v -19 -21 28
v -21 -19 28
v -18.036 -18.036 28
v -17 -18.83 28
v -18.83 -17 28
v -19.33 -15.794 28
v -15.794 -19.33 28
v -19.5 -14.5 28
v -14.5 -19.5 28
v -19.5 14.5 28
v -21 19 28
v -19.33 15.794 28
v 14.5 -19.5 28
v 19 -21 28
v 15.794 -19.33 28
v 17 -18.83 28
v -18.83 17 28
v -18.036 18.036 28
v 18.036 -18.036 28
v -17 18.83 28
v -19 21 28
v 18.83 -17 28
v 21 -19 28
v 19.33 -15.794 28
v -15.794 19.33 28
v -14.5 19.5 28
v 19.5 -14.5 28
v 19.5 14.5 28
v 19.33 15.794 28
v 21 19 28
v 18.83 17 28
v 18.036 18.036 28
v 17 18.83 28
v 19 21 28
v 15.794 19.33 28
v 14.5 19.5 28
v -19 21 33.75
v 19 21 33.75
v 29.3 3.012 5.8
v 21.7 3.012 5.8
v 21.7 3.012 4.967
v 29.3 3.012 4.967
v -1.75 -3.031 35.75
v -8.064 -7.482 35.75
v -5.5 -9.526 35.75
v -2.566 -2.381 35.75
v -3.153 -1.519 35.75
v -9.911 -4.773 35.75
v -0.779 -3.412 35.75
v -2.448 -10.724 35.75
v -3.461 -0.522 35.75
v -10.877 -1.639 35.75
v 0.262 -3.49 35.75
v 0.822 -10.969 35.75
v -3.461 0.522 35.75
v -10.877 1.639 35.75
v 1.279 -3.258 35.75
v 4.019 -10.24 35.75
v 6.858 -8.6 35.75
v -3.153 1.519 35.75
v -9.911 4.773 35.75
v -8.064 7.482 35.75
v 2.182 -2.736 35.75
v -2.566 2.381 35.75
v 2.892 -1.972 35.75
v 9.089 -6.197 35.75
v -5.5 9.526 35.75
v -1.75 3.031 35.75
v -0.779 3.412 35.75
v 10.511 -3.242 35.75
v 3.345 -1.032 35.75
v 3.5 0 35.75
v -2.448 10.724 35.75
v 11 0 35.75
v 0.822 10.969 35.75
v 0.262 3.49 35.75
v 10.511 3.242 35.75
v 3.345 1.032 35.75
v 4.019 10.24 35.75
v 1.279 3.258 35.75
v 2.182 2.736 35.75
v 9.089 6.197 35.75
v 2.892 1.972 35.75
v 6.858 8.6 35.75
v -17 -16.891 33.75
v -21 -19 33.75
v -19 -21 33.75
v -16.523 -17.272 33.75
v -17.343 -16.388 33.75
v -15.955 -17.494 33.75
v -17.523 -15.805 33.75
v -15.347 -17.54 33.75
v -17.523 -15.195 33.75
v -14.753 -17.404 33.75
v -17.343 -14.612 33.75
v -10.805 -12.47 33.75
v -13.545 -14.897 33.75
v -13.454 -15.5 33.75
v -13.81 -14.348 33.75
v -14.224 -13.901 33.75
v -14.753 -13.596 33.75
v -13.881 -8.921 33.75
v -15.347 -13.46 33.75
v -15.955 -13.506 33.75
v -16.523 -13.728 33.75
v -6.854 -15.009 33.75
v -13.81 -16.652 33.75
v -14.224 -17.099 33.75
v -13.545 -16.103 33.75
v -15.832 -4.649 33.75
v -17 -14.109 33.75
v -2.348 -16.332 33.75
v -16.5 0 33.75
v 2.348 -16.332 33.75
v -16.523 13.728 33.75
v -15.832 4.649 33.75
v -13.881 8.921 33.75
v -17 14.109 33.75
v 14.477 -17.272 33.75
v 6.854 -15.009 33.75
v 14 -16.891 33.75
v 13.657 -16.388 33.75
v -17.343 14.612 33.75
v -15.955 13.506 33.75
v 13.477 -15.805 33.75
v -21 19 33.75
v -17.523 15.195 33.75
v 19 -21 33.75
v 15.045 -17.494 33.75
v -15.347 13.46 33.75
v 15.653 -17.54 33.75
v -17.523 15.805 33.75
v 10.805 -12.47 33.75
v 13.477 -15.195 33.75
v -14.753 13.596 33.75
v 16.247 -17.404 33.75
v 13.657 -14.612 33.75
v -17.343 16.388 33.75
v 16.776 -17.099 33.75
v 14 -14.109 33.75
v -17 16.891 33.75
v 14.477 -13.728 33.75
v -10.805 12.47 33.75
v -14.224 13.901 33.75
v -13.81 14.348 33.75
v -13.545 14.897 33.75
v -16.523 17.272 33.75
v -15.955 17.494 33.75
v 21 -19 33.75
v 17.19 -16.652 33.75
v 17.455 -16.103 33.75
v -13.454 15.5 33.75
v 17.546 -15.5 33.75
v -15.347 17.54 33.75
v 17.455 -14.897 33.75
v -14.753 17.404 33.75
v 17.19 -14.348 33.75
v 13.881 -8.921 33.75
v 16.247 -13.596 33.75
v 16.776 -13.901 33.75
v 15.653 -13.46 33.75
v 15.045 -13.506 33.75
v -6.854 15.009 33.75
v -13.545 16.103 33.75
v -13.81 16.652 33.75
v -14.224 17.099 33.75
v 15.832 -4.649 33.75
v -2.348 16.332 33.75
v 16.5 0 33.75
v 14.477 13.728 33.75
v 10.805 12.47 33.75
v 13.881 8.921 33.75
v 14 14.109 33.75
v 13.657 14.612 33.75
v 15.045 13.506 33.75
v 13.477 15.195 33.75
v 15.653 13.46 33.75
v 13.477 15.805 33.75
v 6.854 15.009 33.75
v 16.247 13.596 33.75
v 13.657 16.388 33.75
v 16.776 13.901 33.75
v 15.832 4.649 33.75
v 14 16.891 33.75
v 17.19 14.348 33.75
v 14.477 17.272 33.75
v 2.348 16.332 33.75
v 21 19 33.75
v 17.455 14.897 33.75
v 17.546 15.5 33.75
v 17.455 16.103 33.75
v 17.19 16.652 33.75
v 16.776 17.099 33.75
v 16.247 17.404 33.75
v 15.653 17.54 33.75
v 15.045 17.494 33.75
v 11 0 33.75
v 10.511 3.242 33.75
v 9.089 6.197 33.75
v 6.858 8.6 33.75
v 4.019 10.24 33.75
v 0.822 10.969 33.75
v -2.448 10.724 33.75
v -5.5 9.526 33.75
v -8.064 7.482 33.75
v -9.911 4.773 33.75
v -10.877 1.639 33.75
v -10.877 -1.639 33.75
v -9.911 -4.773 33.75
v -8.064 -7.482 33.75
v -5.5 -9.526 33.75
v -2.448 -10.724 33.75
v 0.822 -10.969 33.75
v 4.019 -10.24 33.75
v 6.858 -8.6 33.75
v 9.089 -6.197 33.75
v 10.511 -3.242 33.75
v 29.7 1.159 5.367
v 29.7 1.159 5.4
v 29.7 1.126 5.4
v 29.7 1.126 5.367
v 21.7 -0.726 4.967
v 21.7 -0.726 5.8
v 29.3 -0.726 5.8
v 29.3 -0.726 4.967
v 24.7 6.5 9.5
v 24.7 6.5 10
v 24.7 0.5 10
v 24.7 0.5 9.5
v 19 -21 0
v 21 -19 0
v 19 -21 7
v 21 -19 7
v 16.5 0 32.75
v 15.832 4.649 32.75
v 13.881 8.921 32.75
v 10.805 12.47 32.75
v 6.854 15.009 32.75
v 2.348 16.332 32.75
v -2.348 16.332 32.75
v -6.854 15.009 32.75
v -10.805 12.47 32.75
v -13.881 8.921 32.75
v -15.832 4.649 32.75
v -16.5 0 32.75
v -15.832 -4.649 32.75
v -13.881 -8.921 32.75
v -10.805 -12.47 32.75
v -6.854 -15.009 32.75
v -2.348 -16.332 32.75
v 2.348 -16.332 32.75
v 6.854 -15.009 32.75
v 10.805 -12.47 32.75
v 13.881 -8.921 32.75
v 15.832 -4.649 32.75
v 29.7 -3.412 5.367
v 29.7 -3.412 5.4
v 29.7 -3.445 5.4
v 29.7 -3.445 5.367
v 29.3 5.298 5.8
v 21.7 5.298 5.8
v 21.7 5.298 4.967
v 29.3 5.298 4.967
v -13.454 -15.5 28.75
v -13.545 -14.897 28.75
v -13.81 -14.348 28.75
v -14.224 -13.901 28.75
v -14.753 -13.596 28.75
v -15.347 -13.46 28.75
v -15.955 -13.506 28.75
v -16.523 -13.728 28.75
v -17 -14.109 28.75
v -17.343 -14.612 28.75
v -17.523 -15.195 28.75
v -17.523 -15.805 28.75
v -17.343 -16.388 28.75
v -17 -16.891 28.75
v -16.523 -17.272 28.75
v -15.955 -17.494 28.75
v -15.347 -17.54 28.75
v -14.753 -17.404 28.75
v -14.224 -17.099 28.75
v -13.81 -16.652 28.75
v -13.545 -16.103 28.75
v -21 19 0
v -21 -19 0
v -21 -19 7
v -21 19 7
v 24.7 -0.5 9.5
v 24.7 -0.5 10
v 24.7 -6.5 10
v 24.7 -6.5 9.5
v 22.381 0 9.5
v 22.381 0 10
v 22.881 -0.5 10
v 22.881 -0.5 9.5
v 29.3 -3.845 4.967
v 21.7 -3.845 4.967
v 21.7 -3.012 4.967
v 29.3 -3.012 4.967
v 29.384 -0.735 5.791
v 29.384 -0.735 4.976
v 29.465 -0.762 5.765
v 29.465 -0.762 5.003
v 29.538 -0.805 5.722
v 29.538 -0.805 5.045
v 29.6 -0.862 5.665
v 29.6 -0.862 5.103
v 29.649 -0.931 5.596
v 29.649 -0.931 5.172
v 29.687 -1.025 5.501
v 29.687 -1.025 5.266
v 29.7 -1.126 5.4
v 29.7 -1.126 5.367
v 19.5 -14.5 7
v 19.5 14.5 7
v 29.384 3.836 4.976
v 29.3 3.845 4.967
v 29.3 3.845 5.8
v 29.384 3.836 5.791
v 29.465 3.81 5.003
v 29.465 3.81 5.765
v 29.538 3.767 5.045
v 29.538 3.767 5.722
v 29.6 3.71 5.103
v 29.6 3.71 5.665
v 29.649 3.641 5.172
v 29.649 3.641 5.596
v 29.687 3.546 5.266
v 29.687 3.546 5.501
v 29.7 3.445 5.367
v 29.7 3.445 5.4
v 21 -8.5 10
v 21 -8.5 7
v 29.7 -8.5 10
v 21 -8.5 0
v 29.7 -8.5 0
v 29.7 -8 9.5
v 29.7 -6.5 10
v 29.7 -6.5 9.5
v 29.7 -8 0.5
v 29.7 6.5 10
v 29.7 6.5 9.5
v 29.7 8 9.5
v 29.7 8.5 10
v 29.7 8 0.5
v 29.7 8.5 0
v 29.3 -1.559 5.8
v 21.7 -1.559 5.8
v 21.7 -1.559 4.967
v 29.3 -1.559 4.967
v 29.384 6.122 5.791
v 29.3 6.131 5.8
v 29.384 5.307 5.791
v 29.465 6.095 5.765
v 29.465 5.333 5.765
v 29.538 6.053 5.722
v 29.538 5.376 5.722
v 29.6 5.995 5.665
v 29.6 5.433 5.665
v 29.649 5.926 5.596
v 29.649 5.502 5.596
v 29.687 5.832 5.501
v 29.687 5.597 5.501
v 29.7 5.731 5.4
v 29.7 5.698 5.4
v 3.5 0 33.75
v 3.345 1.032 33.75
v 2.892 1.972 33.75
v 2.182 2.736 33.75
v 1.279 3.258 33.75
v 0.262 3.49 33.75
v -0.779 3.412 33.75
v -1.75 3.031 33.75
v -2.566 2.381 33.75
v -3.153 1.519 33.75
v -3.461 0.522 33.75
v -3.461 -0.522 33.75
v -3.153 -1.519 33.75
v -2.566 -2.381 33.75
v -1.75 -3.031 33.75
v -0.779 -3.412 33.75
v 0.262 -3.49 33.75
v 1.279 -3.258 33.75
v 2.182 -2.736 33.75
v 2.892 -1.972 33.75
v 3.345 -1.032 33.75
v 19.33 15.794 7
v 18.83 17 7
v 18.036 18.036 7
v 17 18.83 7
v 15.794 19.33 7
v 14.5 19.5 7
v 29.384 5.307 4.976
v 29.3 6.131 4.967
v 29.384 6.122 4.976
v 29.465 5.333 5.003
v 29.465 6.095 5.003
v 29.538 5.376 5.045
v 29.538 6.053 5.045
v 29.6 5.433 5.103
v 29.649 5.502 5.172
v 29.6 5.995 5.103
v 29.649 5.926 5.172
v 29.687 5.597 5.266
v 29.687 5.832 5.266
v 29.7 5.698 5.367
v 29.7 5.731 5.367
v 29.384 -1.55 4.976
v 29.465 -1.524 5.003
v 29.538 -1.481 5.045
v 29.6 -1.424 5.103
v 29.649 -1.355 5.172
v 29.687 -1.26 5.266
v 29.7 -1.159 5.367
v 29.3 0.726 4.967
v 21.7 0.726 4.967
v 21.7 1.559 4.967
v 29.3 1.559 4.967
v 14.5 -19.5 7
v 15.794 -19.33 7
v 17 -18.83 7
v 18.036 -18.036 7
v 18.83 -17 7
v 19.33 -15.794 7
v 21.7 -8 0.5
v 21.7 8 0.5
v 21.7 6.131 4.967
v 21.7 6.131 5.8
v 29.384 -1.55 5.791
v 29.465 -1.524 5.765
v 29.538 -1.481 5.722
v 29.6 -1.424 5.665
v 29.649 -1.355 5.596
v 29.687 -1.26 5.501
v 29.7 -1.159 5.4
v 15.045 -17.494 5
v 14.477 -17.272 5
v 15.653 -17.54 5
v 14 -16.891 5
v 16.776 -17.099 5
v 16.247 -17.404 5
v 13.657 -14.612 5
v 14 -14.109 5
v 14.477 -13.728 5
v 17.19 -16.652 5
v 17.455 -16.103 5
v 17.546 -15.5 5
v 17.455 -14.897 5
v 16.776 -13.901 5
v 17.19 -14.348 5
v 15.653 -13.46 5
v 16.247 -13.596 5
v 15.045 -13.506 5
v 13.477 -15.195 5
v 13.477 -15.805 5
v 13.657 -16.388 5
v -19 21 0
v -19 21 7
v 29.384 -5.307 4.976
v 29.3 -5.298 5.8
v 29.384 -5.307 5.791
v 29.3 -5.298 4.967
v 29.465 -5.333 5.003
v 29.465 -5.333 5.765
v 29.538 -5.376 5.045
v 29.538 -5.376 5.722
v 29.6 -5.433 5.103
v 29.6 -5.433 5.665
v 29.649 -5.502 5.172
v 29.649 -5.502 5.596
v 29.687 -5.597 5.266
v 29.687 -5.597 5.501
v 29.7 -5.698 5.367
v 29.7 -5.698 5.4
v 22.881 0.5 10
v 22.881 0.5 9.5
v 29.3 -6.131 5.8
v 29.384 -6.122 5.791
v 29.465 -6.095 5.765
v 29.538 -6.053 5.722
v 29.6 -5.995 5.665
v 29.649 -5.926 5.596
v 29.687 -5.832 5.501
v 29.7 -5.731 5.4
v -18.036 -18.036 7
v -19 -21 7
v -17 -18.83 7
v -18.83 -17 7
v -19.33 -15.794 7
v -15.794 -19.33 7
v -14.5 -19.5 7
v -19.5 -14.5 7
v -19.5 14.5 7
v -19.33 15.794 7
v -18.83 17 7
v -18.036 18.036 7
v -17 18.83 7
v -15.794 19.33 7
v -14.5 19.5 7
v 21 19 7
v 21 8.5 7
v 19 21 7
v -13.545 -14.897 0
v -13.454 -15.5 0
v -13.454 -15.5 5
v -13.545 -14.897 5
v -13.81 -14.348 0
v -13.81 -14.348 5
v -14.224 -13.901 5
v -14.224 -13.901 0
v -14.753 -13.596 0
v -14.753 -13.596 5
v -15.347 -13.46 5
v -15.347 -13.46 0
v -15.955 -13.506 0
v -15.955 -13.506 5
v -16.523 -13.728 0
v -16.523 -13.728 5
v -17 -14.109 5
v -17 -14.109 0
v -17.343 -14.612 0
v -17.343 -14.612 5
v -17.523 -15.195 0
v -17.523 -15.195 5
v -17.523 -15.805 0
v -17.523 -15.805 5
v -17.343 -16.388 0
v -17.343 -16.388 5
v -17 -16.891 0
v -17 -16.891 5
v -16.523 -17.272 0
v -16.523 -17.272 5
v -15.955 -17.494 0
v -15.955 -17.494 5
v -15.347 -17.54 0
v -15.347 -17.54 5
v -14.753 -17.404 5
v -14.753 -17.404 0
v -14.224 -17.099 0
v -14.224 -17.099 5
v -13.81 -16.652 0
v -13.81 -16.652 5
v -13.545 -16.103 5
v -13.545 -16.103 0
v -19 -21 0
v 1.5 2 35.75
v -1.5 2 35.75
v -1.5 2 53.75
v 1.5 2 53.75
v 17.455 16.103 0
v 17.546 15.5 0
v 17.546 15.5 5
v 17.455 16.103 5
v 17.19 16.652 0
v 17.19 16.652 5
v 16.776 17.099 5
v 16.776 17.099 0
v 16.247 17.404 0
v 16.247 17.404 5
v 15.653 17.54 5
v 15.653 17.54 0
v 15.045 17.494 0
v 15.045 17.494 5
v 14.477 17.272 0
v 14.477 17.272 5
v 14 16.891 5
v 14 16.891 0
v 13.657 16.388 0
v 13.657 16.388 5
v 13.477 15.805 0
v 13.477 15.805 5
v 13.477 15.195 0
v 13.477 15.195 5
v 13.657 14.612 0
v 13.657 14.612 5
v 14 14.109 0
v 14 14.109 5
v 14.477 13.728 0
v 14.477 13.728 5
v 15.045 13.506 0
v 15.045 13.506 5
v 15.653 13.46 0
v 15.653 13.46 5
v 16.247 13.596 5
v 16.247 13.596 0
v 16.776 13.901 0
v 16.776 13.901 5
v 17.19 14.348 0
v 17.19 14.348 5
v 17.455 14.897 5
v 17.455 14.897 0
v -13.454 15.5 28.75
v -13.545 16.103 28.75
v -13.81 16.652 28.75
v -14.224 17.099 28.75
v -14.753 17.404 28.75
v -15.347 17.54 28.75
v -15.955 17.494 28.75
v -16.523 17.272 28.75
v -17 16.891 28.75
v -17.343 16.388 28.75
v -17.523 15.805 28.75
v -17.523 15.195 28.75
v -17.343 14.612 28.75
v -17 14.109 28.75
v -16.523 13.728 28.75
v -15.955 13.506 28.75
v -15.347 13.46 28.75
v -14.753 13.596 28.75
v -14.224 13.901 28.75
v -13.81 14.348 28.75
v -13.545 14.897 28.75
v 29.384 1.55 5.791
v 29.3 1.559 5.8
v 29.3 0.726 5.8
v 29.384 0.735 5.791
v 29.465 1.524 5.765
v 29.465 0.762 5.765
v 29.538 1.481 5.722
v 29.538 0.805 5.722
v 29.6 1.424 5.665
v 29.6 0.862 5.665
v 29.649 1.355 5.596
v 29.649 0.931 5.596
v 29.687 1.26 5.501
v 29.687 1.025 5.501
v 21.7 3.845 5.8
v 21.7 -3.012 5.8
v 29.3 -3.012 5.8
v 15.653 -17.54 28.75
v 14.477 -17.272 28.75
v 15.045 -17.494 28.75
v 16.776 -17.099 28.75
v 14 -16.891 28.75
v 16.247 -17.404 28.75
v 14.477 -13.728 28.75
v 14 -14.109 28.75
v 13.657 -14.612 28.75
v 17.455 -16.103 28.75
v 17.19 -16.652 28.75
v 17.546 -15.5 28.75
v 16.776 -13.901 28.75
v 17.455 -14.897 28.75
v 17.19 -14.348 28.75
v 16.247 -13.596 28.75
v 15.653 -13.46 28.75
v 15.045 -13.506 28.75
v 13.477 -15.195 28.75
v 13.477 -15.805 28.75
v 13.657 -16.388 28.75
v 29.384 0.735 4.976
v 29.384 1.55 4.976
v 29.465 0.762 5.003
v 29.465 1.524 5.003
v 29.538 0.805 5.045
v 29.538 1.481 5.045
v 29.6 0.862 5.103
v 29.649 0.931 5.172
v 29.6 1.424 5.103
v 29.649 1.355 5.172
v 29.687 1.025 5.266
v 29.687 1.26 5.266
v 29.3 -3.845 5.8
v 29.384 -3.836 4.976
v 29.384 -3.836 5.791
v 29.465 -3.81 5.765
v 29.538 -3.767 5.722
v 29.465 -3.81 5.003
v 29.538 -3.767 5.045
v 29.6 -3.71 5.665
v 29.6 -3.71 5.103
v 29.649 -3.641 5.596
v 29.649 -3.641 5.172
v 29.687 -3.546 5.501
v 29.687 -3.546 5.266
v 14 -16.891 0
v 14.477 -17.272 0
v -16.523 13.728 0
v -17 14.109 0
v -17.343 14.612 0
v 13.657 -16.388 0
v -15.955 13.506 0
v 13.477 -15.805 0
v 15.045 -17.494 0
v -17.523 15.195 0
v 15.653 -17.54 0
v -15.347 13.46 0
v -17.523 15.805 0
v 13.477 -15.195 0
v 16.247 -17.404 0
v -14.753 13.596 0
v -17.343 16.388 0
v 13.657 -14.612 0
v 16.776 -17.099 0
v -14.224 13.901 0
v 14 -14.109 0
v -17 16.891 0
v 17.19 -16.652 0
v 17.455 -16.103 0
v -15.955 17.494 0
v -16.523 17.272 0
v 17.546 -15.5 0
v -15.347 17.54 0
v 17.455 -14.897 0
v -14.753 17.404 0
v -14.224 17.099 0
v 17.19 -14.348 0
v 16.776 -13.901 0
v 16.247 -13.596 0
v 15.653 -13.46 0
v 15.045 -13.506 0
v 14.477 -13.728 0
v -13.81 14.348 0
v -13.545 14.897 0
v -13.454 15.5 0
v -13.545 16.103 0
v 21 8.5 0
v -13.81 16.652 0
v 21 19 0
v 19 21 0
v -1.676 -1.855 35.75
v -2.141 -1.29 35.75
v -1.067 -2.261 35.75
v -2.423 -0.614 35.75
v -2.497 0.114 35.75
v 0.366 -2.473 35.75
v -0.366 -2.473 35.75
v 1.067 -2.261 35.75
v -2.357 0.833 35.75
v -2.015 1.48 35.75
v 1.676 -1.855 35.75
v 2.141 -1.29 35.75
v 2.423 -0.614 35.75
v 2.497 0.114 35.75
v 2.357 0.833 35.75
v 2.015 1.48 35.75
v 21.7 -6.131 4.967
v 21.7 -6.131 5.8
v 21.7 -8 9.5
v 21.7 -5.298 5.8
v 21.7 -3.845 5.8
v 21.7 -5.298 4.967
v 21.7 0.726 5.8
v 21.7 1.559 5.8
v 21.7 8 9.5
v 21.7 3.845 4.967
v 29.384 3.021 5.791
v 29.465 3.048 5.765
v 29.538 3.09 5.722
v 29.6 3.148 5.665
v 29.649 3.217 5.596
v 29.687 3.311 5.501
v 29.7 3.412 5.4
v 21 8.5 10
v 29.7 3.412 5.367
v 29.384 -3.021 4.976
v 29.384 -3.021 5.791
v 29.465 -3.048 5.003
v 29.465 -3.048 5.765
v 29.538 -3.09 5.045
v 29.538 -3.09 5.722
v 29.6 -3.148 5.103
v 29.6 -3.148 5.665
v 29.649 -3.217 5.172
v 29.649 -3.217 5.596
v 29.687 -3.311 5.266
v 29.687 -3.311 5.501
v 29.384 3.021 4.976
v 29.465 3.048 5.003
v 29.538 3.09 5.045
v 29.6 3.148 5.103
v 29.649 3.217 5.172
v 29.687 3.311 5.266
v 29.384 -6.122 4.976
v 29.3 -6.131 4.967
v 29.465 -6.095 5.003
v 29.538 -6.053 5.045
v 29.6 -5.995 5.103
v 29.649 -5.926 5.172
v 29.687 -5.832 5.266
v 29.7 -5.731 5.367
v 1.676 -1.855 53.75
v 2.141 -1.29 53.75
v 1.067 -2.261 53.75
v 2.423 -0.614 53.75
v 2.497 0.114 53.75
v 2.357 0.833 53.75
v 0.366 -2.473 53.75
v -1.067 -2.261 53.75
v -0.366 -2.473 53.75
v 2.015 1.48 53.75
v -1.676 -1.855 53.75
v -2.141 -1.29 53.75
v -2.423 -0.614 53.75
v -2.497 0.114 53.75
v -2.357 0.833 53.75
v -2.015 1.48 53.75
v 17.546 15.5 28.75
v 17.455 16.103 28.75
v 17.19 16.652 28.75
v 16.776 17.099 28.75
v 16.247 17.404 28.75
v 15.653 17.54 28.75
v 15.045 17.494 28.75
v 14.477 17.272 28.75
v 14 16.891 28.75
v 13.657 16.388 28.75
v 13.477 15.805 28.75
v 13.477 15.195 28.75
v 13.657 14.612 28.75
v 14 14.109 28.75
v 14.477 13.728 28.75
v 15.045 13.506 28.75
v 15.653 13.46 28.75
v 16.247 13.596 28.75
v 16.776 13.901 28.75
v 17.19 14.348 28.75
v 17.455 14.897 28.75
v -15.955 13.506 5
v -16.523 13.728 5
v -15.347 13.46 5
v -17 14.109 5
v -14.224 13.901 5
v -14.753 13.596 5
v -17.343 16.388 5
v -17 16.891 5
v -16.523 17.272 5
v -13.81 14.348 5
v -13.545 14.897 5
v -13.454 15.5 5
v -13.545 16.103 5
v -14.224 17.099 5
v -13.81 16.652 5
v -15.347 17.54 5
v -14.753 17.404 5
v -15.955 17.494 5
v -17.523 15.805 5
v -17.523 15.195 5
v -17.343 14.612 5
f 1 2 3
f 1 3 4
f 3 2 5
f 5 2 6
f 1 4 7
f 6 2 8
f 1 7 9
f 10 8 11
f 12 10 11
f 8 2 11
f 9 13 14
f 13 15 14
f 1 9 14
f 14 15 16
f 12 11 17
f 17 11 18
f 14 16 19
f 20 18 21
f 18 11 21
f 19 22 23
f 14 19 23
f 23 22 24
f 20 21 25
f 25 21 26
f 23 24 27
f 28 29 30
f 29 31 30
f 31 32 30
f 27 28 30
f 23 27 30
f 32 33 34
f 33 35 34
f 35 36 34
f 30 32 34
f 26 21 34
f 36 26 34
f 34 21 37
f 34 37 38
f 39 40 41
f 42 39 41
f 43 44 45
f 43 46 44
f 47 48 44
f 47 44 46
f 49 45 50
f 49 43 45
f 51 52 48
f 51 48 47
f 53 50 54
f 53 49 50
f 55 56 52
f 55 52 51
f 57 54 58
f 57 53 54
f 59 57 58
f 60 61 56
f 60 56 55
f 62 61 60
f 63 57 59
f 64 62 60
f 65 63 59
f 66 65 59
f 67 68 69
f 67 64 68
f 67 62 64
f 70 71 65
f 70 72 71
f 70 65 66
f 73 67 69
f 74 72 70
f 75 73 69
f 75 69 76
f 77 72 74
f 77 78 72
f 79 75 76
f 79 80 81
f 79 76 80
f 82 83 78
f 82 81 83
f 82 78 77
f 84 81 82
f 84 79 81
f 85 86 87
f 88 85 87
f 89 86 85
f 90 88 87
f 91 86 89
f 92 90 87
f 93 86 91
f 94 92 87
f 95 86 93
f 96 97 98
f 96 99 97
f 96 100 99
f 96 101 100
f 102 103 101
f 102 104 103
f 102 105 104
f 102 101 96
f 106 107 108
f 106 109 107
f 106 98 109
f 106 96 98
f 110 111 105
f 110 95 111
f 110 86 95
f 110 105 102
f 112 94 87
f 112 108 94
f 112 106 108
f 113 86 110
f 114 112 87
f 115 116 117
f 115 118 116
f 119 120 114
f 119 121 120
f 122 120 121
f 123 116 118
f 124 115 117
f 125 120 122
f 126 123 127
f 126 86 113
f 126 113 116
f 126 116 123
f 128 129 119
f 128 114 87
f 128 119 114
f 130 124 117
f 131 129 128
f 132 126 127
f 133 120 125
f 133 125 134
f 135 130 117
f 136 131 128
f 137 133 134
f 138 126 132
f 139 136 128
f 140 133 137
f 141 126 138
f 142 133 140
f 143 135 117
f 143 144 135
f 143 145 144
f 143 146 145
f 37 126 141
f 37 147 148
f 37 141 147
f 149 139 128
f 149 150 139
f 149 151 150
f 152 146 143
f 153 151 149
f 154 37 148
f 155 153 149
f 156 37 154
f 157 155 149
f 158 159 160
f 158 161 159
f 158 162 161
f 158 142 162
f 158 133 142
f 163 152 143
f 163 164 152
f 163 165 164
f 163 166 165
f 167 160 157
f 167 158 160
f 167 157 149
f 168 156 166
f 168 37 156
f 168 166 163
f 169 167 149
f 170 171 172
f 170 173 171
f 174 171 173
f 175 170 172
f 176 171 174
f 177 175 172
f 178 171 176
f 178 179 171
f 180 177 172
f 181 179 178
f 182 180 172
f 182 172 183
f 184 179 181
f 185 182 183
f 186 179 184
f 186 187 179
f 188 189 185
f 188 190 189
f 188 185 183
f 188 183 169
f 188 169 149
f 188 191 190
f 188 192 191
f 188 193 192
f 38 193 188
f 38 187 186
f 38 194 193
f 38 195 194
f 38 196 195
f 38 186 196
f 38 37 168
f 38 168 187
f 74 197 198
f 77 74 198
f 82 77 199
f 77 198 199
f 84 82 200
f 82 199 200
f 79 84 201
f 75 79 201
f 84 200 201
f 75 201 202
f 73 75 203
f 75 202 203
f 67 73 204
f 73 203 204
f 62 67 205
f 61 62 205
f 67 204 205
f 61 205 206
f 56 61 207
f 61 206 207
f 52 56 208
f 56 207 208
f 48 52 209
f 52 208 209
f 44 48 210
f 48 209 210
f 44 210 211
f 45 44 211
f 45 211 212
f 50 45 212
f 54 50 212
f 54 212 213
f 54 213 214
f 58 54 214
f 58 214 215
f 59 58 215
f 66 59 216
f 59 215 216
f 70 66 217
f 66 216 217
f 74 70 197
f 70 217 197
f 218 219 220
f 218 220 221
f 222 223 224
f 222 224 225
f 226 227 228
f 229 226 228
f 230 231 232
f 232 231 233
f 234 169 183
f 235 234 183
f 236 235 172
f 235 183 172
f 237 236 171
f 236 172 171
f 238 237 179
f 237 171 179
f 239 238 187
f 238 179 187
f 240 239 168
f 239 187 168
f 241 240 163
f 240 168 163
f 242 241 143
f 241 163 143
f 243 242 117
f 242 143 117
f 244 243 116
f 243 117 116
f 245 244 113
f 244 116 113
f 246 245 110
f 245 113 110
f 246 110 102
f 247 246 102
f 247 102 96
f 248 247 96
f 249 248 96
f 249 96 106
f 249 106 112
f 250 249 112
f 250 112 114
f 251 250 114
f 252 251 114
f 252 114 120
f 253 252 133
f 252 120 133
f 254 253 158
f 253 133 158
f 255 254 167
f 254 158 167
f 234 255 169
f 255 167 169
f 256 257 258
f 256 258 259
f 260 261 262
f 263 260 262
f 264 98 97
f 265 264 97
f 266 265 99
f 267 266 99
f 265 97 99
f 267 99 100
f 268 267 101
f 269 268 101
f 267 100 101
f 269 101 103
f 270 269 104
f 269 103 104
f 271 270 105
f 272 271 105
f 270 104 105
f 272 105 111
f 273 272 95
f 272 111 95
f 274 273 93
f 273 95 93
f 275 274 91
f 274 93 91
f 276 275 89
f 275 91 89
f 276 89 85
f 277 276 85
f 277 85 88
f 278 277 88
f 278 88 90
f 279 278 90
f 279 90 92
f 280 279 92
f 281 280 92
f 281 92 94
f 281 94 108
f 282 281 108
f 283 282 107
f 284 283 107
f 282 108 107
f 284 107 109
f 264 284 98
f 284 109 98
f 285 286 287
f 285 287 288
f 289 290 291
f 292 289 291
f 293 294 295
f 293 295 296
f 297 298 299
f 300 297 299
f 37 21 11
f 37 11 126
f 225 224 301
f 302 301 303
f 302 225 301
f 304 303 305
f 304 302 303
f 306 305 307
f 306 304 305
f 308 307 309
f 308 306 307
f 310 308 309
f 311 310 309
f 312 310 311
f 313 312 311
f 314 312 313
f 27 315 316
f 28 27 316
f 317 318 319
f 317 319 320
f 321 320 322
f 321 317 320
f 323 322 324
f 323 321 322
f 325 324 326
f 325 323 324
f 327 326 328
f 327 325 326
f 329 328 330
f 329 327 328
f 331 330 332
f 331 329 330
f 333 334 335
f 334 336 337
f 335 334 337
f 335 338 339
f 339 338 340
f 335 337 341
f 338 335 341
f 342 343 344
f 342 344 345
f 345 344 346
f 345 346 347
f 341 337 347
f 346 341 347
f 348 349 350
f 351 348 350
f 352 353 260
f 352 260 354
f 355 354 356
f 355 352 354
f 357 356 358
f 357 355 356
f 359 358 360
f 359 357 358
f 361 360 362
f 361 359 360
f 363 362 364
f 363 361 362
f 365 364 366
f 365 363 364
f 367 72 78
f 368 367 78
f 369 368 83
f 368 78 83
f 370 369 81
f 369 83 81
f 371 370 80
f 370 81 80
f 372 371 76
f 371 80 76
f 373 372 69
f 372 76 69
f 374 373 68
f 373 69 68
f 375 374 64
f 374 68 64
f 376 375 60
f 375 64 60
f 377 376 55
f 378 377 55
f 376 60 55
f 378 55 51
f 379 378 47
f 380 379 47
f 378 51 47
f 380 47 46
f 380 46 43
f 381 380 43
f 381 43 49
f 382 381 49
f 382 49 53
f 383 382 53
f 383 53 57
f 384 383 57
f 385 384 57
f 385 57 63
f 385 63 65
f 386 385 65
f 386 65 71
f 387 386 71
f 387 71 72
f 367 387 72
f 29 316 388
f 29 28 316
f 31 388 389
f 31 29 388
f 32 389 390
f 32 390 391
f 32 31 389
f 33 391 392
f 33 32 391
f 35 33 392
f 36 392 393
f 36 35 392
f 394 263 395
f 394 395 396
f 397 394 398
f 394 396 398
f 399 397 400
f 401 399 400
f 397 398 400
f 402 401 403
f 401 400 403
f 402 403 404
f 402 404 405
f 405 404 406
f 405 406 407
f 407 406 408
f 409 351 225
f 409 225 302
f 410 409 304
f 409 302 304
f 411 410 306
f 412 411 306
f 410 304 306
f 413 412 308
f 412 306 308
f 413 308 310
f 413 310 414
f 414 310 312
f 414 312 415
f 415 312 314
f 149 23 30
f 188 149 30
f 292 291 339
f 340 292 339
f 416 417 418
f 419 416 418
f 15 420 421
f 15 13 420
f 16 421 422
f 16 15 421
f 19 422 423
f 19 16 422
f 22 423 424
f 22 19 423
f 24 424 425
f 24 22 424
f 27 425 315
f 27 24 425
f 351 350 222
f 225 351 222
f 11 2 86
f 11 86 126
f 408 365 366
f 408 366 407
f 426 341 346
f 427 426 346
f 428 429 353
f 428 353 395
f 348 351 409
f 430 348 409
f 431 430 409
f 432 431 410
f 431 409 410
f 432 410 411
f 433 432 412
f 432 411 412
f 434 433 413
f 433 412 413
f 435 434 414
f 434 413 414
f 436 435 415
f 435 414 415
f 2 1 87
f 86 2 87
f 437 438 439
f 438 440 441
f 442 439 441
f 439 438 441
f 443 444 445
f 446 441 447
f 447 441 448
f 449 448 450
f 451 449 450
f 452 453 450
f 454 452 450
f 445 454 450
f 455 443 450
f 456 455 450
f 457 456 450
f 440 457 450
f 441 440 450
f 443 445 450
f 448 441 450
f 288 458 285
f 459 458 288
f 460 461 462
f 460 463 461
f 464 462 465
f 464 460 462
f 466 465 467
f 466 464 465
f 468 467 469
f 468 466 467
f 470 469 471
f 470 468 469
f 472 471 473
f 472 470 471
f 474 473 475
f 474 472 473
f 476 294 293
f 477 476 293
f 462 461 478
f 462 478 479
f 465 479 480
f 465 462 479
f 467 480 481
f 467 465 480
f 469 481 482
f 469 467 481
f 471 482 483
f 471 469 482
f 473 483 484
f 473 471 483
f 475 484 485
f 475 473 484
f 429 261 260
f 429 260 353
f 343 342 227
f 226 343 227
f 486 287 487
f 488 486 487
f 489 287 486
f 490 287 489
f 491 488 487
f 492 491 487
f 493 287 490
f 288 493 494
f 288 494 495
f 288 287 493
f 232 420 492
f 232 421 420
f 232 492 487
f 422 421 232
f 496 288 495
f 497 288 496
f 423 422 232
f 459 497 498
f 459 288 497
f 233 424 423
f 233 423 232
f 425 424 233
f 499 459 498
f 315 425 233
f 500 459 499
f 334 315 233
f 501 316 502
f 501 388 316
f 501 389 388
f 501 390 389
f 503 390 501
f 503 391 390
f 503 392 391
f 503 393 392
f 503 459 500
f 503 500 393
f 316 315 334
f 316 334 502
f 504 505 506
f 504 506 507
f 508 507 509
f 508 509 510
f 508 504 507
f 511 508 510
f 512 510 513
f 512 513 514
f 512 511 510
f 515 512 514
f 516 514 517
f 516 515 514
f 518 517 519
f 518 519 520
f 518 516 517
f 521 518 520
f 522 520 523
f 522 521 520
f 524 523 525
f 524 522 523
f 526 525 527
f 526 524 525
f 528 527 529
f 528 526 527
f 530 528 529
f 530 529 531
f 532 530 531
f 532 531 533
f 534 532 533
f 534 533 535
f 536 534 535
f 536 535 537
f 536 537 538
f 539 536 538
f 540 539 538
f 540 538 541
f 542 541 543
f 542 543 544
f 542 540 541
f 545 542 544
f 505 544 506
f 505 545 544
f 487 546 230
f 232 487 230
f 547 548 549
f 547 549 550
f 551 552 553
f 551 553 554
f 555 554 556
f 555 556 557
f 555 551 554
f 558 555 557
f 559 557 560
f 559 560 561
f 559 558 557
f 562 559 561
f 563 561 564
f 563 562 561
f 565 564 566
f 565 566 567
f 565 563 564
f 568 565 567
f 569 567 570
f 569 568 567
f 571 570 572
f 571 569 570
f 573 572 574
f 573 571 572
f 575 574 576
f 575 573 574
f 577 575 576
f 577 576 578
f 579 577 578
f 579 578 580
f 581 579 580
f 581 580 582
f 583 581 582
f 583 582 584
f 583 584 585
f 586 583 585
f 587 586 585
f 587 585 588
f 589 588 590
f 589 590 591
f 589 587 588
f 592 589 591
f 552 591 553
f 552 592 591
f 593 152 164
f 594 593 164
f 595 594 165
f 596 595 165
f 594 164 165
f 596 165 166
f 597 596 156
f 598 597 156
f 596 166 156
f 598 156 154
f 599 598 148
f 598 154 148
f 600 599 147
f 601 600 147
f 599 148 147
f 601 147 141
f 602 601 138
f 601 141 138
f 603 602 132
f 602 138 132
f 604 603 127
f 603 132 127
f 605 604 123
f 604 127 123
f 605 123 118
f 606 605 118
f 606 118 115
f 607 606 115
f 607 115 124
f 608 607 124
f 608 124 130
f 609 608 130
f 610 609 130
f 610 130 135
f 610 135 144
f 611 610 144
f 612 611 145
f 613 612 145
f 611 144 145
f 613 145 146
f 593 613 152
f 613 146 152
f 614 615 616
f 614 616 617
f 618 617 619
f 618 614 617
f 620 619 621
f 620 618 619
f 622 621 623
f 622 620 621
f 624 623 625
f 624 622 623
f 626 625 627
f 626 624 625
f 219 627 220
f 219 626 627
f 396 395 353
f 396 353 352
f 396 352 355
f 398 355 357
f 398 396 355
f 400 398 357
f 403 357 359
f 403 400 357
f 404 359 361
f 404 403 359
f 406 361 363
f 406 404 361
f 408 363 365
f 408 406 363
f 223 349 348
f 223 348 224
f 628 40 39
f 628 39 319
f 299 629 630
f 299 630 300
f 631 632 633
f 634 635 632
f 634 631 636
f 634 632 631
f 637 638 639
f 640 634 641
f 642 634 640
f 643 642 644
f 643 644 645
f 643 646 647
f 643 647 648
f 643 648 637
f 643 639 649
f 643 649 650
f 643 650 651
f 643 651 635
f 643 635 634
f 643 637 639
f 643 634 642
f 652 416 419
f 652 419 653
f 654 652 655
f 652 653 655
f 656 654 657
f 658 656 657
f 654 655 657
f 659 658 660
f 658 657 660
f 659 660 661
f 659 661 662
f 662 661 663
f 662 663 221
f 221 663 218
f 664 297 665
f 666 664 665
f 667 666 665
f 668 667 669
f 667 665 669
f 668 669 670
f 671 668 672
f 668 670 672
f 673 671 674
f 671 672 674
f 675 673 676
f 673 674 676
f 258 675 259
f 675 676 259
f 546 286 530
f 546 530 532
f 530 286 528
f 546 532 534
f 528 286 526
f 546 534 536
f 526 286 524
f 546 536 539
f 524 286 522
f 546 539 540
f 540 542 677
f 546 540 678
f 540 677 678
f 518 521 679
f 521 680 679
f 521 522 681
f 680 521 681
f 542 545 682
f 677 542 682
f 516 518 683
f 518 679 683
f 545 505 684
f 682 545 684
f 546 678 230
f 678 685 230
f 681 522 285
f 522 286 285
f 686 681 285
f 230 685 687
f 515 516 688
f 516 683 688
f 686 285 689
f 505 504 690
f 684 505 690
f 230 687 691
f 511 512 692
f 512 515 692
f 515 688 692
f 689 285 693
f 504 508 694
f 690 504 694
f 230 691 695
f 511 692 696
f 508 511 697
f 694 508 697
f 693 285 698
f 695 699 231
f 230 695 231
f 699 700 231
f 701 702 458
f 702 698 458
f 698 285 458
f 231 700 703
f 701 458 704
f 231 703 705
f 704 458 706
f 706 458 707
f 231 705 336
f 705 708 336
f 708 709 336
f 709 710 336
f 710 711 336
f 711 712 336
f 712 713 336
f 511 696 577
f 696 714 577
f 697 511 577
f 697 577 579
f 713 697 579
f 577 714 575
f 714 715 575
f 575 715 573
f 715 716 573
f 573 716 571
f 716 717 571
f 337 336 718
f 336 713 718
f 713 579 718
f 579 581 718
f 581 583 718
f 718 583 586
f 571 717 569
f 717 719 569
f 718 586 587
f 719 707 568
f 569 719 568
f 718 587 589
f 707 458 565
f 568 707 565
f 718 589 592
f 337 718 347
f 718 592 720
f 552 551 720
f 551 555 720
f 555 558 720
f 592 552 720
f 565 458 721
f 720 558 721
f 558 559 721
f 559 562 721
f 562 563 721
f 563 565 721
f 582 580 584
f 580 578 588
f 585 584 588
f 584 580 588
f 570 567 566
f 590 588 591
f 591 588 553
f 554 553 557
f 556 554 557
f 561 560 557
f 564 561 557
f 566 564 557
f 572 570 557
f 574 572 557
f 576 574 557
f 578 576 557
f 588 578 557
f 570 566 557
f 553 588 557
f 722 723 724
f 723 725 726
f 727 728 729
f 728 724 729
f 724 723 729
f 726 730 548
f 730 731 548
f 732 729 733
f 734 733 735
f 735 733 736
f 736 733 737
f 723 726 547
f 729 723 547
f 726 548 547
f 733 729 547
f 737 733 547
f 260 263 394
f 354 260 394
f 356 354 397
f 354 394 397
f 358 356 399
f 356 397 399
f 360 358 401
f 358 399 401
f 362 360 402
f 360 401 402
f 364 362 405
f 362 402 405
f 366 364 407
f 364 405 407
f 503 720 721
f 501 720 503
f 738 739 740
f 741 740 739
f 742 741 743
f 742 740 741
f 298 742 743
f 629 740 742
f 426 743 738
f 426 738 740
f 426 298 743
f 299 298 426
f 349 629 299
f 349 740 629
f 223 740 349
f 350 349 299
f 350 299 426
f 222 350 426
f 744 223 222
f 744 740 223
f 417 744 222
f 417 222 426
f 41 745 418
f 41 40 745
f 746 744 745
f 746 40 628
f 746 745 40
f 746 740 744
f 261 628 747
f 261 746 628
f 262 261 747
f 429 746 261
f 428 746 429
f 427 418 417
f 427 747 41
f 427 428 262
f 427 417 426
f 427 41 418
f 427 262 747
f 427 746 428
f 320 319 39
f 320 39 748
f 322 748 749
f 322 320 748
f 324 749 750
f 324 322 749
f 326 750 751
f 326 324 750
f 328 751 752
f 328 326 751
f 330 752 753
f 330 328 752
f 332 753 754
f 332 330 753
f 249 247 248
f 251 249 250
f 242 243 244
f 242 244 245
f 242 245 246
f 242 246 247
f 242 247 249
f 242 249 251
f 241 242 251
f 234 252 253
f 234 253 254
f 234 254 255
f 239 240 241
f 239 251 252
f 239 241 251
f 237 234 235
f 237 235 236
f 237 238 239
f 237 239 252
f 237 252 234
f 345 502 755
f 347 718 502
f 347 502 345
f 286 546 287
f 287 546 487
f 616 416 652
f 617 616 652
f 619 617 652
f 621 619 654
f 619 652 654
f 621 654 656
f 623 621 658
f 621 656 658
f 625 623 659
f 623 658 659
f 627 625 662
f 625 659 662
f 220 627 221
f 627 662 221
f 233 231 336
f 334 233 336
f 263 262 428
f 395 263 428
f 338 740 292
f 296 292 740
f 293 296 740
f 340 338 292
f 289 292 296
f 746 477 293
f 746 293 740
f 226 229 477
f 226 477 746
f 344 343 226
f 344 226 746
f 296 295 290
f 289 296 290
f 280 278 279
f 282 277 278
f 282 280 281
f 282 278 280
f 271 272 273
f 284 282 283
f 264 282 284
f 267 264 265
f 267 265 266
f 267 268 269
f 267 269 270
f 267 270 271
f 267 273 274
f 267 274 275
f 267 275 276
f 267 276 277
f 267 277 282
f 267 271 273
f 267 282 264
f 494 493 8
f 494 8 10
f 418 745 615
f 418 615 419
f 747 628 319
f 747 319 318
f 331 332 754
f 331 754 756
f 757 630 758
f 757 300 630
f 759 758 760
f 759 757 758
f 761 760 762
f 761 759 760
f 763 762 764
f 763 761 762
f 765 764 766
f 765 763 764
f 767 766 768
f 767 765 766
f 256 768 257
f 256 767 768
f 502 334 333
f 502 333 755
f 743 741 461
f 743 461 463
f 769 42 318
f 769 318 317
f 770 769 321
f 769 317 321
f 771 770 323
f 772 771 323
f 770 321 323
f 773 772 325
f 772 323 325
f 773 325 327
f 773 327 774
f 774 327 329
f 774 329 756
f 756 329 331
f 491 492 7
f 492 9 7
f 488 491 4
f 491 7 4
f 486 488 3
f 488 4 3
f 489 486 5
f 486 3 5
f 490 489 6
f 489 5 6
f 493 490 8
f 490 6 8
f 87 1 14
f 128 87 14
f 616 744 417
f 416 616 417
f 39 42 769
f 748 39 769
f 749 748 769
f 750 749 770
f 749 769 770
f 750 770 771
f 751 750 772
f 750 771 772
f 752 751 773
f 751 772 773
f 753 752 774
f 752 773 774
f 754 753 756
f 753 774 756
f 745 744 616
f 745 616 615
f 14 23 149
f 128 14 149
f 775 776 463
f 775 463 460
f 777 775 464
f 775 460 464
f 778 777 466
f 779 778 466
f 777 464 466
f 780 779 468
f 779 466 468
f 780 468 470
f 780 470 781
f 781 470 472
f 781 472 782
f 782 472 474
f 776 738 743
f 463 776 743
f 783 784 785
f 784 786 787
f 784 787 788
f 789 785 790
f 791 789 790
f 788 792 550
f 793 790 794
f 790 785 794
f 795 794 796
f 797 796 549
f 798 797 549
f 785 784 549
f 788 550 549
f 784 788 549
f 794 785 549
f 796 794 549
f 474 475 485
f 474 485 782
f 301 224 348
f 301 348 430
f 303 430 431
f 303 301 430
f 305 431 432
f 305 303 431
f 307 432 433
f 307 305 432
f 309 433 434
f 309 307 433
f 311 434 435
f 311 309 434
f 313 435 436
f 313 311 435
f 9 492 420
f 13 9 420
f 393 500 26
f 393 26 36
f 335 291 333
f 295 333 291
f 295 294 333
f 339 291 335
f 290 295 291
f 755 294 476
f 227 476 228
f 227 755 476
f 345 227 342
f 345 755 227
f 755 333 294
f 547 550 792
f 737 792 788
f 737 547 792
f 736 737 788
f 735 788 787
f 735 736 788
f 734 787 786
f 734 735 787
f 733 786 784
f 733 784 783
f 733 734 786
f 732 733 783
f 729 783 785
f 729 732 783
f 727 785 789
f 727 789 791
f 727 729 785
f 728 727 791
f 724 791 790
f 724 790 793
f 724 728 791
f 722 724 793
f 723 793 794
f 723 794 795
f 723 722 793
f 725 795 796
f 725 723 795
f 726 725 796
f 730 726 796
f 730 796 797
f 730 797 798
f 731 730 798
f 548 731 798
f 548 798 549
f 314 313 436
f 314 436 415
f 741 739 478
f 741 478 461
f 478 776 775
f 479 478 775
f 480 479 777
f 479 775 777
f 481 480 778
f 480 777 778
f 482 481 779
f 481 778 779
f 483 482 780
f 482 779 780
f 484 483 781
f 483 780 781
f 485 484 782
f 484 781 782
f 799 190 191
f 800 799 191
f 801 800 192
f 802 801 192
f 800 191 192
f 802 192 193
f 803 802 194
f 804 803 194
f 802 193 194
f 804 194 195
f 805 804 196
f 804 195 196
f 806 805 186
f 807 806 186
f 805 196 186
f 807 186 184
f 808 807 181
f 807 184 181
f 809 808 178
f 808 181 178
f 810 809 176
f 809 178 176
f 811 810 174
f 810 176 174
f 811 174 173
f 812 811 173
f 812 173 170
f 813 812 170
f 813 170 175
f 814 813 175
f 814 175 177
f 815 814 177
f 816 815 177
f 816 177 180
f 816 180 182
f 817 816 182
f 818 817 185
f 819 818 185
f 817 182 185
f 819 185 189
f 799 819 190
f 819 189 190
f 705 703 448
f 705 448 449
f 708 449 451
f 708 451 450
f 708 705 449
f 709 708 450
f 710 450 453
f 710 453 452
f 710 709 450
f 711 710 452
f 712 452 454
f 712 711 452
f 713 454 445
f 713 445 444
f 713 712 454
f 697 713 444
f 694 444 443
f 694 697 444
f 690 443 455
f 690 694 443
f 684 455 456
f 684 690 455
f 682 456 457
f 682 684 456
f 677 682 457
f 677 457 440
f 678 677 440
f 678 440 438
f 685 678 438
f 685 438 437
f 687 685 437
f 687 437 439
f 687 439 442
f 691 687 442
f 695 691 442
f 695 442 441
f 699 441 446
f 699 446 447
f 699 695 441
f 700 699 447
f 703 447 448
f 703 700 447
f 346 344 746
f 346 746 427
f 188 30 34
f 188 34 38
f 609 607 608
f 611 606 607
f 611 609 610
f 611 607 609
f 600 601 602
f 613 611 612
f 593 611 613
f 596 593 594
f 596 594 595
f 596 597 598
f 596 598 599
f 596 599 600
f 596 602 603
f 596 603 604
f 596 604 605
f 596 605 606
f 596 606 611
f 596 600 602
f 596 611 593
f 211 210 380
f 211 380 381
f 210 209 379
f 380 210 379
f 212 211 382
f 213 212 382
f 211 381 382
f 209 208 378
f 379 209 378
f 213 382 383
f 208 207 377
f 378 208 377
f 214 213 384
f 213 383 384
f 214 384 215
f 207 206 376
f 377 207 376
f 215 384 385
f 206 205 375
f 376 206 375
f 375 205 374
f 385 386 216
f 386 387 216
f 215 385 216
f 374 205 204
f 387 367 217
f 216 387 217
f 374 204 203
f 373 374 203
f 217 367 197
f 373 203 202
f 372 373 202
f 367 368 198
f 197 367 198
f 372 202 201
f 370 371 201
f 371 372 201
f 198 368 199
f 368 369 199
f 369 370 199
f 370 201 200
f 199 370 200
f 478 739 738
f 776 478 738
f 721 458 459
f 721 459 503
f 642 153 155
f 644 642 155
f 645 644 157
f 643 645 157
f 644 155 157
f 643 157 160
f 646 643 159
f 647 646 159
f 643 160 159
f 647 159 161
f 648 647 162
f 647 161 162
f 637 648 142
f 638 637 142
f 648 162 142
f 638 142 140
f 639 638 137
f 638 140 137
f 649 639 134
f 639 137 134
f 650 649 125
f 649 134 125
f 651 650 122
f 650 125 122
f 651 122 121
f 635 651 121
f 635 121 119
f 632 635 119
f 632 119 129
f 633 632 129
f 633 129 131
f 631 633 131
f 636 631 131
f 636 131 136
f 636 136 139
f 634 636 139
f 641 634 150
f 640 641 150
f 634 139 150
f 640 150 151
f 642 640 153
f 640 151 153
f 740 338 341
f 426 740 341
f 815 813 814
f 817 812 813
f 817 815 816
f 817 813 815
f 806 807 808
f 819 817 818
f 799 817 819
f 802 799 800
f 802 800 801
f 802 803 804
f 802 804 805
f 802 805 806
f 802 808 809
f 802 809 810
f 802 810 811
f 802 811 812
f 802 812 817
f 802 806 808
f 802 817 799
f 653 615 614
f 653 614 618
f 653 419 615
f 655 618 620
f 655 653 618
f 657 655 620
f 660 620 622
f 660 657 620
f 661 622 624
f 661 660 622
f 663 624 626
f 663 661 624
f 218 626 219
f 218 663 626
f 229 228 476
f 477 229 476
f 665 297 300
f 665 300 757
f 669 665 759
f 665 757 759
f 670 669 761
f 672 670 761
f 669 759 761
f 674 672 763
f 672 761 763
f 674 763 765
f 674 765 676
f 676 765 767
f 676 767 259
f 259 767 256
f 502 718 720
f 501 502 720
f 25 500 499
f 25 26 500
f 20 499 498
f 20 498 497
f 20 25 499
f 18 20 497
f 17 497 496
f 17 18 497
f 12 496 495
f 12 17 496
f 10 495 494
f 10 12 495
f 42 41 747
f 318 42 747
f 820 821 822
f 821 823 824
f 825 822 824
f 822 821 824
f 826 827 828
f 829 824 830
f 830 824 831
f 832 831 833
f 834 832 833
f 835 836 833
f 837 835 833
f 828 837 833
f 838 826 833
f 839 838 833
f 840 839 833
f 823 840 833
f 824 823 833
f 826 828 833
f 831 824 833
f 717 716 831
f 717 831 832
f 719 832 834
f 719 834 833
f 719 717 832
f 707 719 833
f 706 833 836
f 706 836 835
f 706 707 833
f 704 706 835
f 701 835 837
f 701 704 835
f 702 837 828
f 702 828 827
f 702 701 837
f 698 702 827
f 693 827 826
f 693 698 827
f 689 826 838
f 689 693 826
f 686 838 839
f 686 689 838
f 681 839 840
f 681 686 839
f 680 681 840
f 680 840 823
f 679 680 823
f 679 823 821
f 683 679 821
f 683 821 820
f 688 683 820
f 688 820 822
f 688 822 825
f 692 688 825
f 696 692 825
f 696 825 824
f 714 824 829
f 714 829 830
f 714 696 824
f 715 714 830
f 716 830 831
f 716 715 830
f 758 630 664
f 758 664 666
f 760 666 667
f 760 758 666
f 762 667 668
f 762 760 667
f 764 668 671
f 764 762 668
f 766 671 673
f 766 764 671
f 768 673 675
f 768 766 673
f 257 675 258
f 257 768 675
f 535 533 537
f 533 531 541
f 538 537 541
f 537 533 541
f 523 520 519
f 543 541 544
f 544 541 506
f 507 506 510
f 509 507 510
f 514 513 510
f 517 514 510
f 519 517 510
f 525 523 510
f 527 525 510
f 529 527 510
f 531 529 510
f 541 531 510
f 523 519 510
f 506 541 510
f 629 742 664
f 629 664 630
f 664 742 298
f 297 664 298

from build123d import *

# Parameters (mm, degrees)
SALIENTE_EXTRUIR1_DEPTH = 53.75
CROQUIS5_W              = 42
CROQUIS5_H              = 42
SALIENTE_EXTRUIR2_DEPTH = 7
CROQUIS5_3_W            = 8.7
CROQUIS5_3_H            = 17
SALIENTE_EXTRUIR3_DEPTH = 10
CROQUIS6_W              = 39
CROQUIS6_H              = 39
SALIENTE_EXTRUIR4_DEPTH = 21
CROQUIS7_W              = 42
CROQUIS7_H              = 42
SALIENTE_EXTRUIR5_DEPTH = 5.75
CROQUIS8_R              = 11
SALIENTE_EXTRUIR6_DEPTH = 2
CROQUIS9_R              = 16.5
CORTAR_EXTRUIR3_DEPTH   = 1
CROQUIS10_R             = 3.5
CORTAR_EXTRUIR4_DEPTH   = 3
CHAFL_N1_SIZE           = 2
REDONDEO1_R             = 5
CROQUIS11_R             = 2.045783435
CORTAR_EXTRUIR5_DEPTH   = 5
CROQUIS12_R             = 2.045783435
CORTAR_EXTRUIR6_DEPTH   = 5
CROQUIS13_W             = 9
CROQUIS13_H             = 16
CORTAR_EXTRUIR7_DEPTH   = 8
CORTAR_EXTRUIR9_DEPTH   = 0.5
CHAFL_N2_SIZE           = 0.5
CROQUIS16_W             = 0.833018764
CROQUIS16_H             = 0.833018765
CROQUIS16_H_2           = 0.833018764
SALIENTE_EXTRUIR7_DEPTH = 8
REDONDEO19_R            = 0.4


with BuildPart() as part:
    # Croquis3 → Saliente-Extruir1 (new body)
    with BuildSketch(Plane.XY):
        with BuildLine():
            Line((-1.5, 2), (1.5, 2))
            ThreePointArc((1.5, 2), (0, -2.5), (-1.5, 2))
        make_face()
    extrude(amount=SALIENTE_EXTRUIR1_DEPTH)

    # Croquis5 → Saliente-Extruir2 (add)
    with BuildSketch(Plane.XY):
        Rectangle(CROQUIS5_W, CROQUIS5_H)
    extrude(amount=SALIENTE_EXTRUIR2_DEPTH)

    # Croquis5<3> → Saliente-Extruir3 (add)
    with BuildSketch(Plane.XY):
        with Locations((25.35, 0)):
            Rectangle(CROQUIS5_3_W, CROQUIS5_3_H)
    extrude(amount=SALIENTE_EXTRUIR3_DEPTH)

    # Croquis6 → Saliente-Extruir4 (add)
    with BuildSketch(Plane.XY.offset(7)):
        Rectangle(CROQUIS6_W, CROQUIS6_H)
    extrude(amount=SALIENTE_EXTRUIR4_DEPTH)

    # Croquis7 → Saliente-Extruir5 (add)
    with BuildSketch(Plane.XY.offset(28)):
        Rectangle(CROQUIS7_W, CROQUIS7_H)
    extrude(amount=SALIENTE_EXTRUIR5_DEPTH)

    # Croquis8 → Saliente-Extruir6 (add)
    with BuildSketch(Plane.XY.offset(33.75)):
        Circle(CROQUIS8_R)
    extrude(amount=SALIENTE_EXTRUIR6_DEPTH)

    # Croquis9 → Cortar-Extruir3 (cut)
    with BuildSketch(Plane.XY.offset(33.75)):
        Circle(CROQUIS9_R)
    extrude(amount=-CORTAR_EXTRUIR3_DEPTH, mode=Mode.SUBTRACT)


with BuildPart() as cortar_extruir3_piece_1:
    # of the separate pieces the step leaves, piece 1, a body of its own (cortar_extruir3_pieces)
    add(part.part.solids().sort_by_distance((21, 21, 0))[0])

    # Chaflán1
    chafl_n1_edges = [cortar_extruir3_piece_1.edges().sort_by_distance(p)[0] for p in [
        (21, -21, 3.5),
        (21, 21, 3.5),
        (-21, 21, 3.5),
        (-21, -21, 3.5),
        (-21, 21, 30.875),
        (-21, -21, 30.875),
        (21, -21, 30.875),
        (21, 21, 30.875),
    ]]
    chamfer(chafl_n1_edges, length=CHAFL_N1_SIZE)

    # Redondeo1
    redondeo1_edges = [cortar_extruir3_piece_1.edges().sort_by_distance(p)[0] for p in [
        (-19.5, 19.5, 17.5),
        (-19.5, -19.5, 17.5),
        (19.5, -19.5, 17.5),
        (19.5, 19.5, 17.5),
    ]]
    fillet(redondeo1_edges, radius=REDONDEO1_R)

    # Croquis11 → Cortar-Extruir5 (cut)
    with BuildSketch(Plane.XY.offset(33.75)):
        with Locations((-15.5, 15.5)):
            Circle(CROQUIS11_R)
        with Locations((15.5, 15.5)):
            Circle(CROQUIS11_R)
        with Locations((15.5, -15.5)):
            Circle(CROQUIS11_R)
        with Locations((-15.5, -15.5)):
            Circle(CROQUIS11_R)
    extrude(amount=-CORTAR_EXTRUIR5_DEPTH, mode=Mode.SUBTRACT)

    # Croquis12 → Cortar-Extruir6 (cut)
    with BuildSketch(Plane.XY):
        with Locations((-15.5, 15.5)):
            Circle(CROQUIS12_R)
        with Locations((15.5, 15.5)):
            Circle(CROQUIS12_R)
        with Locations((15.5, -15.5)):
            Circle(CROQUIS12_R)
        with Locations((-15.5, -15.5)):
            Circle(CROQUIS12_R)
    extrude(amount=CORTAR_EXTRUIR6_DEPTH, mode=Mode.SUBTRACT)

    # Croquis13 → Cortar-Extruir7 (cut)
    with BuildSketch(Plane(origin=(29.7, 0, 0), x_dir=(0, 0, -1), z_dir=(1, 0, 0))):
        with Locations((-5, 0)):
            Rectangle(CROQUIS13_W, CROQUIS13_H)
    extrude(amount=-CORTAR_EXTRUIR7_DEPTH, mode=Mode.SUBTRACT)

    # Croquis15 → Cortar-Extruir9 (cut)
    with BuildSketch(Plane.XY.offset(10)):
        Polygon((29.7, -6.5), (29.7, 6.5), (24.7, 6.5), (24.7, 0.5), (22.381487387, 0.5), (22.381487387, 0), (22.381487387, -0.5), (24.7, -0.5), (24.7, -6.5), align=None)
    extrude(amount=-CORTAR_EXTRUIR9_DEPTH, mode=Mode.SUBTRACT)

    # Chaflán2
    chafl_n2_edges = [cortar_extruir3_piece_1.edges().sort_by_distance(p)[0] for p in [
        (22.381487387, -0.5, 9.75),
        (22.381487387, 0.5, 9.75),
    ]]
    chamfer(chafl_n2_edges, length=CHAFL_N2_SIZE - 0.0001)  # a hair under: the kernel refuses the full size

    # Croquis16 → Saliente-Extruir7 (add)
    with BuildSketch(Plane(origin=(21.7, 0, 0), x_dir=(0, 0, -1), z_dir=(1, 0, 0))):
        with Locations((-5.383746168, 5.714285715)):
            Rectangle(CROQUIS16_W, CROQUIS16_H)
        with Locations((-5.383746168, -5.714285715)):
            Rectangle(CROQUIS16_W, CROQUIS16_H)
        with Locations((-5.383746168, -3.428571429)):
            Rectangle(CROQUIS16_W, CROQUIS16_H)
        with Locations((-5.383746168, -1.142857143)):
            Rectangle(CROQUIS16_W, CROQUIS16_H_2)
        with Locations((-5.383746168, 1.142857143)):
            Rectangle(CROQUIS16_W, CROQUIS16_H_2)
        with Locations((-5.383746168, 3.428571429)):
            Rectangle(CROQUIS16_W, CROQUIS16_H)
    extrude(amount=SALIENTE_EXTRUIR7_DEPTH)

    # Redondeo19
    redondeo19_edges = [cortar_extruir3_piece_1.edges().sort_by_distance(p)[0] for p in [
        (29.7, 5.714285714, 5.80025555),
        (29.7, 5.297776332, 5.383746168),
        (29.7, 5.714285714, 4.967236786),
        (29.7, 6.130795097, 5.383746168),
        (29.7, -5.714285714, 5.80025555),
        (29.7, -6.130795097, 5.383746168),
        (29.7, -5.714285714, 4.967236786),
        (29.7, -5.297776332, 5.383746168),
        (29.7, -3.428571429, 5.80025555),
        (29.7, -3.845080811, 5.383746168),
        (29.7, -3.428571429, 4.967236786),
        (29.7, -3.012062046, 5.383746168),
        (29.7, -1.142857143, 5.80025555),
        (29.7, -1.559366525, 5.383746168),
        (29.7, -1.142857143, 4.967236786),
        (29.7, -0.726347761, 5.383746168),
        (29.7, 1.142857143, 5.80025555),
        (29.7, 0.726347761, 5.383746168),
        (29.7, 1.142857143, 4.967236786),
        (29.7, 1.559366525, 5.383746168),
        (29.7, 3.428571429, 5.80025555),
        (29.7, 3.012062046, 5.383746168),
        (29.7, 3.428571429, 4.967236786),
        (29.7, 3.845080811, 5.383746168),
    ]]
    fillet(redondeo19_edges, radius=REDONDEO19_R)


with BuildPart() as cortar_extruir3_piece_2:
    # of the separate pieces the step leaves, piece 2, a body of its own (cortar_extruir3_pieces)
    add(part.part.solids().sort_by_distance((11, 0, 33.75))[0])

    # Croquis10 → Cortar-Extruir4 (cut)
    with BuildSketch(Plane.XY.offset(35.75)):
        Circle(CROQUIS10_R)
    extrude(amount=-CORTAR_EXTRUIR4_DEPTH, mode=Mode.SUBTRACT)


with BuildPart() as cortar_extruir4_piece_1:
    # of the separate pieces the step leaves, piece 1, a body of its own (cortar_extruir4_pieces)
    add(cortar_extruir3_piece_2.part.solids().sort_by_distance((11, 0, 33.75))[0])


with BuildPart() as cortar_extruir4_piece_2:
    # of the separate pieces the step leaves, piece 2, a body of its own (cortar_extruir4_pieces)
    add(cortar_extruir3_piece_2.part.solids().sort_by_distance((1.5, 2, 35.75))[0])


solid = Compound([cortar_extruir3_piece_1.part, cortar_extruir4_piece_1.part, cortar_extruir4_piece_2.part])
